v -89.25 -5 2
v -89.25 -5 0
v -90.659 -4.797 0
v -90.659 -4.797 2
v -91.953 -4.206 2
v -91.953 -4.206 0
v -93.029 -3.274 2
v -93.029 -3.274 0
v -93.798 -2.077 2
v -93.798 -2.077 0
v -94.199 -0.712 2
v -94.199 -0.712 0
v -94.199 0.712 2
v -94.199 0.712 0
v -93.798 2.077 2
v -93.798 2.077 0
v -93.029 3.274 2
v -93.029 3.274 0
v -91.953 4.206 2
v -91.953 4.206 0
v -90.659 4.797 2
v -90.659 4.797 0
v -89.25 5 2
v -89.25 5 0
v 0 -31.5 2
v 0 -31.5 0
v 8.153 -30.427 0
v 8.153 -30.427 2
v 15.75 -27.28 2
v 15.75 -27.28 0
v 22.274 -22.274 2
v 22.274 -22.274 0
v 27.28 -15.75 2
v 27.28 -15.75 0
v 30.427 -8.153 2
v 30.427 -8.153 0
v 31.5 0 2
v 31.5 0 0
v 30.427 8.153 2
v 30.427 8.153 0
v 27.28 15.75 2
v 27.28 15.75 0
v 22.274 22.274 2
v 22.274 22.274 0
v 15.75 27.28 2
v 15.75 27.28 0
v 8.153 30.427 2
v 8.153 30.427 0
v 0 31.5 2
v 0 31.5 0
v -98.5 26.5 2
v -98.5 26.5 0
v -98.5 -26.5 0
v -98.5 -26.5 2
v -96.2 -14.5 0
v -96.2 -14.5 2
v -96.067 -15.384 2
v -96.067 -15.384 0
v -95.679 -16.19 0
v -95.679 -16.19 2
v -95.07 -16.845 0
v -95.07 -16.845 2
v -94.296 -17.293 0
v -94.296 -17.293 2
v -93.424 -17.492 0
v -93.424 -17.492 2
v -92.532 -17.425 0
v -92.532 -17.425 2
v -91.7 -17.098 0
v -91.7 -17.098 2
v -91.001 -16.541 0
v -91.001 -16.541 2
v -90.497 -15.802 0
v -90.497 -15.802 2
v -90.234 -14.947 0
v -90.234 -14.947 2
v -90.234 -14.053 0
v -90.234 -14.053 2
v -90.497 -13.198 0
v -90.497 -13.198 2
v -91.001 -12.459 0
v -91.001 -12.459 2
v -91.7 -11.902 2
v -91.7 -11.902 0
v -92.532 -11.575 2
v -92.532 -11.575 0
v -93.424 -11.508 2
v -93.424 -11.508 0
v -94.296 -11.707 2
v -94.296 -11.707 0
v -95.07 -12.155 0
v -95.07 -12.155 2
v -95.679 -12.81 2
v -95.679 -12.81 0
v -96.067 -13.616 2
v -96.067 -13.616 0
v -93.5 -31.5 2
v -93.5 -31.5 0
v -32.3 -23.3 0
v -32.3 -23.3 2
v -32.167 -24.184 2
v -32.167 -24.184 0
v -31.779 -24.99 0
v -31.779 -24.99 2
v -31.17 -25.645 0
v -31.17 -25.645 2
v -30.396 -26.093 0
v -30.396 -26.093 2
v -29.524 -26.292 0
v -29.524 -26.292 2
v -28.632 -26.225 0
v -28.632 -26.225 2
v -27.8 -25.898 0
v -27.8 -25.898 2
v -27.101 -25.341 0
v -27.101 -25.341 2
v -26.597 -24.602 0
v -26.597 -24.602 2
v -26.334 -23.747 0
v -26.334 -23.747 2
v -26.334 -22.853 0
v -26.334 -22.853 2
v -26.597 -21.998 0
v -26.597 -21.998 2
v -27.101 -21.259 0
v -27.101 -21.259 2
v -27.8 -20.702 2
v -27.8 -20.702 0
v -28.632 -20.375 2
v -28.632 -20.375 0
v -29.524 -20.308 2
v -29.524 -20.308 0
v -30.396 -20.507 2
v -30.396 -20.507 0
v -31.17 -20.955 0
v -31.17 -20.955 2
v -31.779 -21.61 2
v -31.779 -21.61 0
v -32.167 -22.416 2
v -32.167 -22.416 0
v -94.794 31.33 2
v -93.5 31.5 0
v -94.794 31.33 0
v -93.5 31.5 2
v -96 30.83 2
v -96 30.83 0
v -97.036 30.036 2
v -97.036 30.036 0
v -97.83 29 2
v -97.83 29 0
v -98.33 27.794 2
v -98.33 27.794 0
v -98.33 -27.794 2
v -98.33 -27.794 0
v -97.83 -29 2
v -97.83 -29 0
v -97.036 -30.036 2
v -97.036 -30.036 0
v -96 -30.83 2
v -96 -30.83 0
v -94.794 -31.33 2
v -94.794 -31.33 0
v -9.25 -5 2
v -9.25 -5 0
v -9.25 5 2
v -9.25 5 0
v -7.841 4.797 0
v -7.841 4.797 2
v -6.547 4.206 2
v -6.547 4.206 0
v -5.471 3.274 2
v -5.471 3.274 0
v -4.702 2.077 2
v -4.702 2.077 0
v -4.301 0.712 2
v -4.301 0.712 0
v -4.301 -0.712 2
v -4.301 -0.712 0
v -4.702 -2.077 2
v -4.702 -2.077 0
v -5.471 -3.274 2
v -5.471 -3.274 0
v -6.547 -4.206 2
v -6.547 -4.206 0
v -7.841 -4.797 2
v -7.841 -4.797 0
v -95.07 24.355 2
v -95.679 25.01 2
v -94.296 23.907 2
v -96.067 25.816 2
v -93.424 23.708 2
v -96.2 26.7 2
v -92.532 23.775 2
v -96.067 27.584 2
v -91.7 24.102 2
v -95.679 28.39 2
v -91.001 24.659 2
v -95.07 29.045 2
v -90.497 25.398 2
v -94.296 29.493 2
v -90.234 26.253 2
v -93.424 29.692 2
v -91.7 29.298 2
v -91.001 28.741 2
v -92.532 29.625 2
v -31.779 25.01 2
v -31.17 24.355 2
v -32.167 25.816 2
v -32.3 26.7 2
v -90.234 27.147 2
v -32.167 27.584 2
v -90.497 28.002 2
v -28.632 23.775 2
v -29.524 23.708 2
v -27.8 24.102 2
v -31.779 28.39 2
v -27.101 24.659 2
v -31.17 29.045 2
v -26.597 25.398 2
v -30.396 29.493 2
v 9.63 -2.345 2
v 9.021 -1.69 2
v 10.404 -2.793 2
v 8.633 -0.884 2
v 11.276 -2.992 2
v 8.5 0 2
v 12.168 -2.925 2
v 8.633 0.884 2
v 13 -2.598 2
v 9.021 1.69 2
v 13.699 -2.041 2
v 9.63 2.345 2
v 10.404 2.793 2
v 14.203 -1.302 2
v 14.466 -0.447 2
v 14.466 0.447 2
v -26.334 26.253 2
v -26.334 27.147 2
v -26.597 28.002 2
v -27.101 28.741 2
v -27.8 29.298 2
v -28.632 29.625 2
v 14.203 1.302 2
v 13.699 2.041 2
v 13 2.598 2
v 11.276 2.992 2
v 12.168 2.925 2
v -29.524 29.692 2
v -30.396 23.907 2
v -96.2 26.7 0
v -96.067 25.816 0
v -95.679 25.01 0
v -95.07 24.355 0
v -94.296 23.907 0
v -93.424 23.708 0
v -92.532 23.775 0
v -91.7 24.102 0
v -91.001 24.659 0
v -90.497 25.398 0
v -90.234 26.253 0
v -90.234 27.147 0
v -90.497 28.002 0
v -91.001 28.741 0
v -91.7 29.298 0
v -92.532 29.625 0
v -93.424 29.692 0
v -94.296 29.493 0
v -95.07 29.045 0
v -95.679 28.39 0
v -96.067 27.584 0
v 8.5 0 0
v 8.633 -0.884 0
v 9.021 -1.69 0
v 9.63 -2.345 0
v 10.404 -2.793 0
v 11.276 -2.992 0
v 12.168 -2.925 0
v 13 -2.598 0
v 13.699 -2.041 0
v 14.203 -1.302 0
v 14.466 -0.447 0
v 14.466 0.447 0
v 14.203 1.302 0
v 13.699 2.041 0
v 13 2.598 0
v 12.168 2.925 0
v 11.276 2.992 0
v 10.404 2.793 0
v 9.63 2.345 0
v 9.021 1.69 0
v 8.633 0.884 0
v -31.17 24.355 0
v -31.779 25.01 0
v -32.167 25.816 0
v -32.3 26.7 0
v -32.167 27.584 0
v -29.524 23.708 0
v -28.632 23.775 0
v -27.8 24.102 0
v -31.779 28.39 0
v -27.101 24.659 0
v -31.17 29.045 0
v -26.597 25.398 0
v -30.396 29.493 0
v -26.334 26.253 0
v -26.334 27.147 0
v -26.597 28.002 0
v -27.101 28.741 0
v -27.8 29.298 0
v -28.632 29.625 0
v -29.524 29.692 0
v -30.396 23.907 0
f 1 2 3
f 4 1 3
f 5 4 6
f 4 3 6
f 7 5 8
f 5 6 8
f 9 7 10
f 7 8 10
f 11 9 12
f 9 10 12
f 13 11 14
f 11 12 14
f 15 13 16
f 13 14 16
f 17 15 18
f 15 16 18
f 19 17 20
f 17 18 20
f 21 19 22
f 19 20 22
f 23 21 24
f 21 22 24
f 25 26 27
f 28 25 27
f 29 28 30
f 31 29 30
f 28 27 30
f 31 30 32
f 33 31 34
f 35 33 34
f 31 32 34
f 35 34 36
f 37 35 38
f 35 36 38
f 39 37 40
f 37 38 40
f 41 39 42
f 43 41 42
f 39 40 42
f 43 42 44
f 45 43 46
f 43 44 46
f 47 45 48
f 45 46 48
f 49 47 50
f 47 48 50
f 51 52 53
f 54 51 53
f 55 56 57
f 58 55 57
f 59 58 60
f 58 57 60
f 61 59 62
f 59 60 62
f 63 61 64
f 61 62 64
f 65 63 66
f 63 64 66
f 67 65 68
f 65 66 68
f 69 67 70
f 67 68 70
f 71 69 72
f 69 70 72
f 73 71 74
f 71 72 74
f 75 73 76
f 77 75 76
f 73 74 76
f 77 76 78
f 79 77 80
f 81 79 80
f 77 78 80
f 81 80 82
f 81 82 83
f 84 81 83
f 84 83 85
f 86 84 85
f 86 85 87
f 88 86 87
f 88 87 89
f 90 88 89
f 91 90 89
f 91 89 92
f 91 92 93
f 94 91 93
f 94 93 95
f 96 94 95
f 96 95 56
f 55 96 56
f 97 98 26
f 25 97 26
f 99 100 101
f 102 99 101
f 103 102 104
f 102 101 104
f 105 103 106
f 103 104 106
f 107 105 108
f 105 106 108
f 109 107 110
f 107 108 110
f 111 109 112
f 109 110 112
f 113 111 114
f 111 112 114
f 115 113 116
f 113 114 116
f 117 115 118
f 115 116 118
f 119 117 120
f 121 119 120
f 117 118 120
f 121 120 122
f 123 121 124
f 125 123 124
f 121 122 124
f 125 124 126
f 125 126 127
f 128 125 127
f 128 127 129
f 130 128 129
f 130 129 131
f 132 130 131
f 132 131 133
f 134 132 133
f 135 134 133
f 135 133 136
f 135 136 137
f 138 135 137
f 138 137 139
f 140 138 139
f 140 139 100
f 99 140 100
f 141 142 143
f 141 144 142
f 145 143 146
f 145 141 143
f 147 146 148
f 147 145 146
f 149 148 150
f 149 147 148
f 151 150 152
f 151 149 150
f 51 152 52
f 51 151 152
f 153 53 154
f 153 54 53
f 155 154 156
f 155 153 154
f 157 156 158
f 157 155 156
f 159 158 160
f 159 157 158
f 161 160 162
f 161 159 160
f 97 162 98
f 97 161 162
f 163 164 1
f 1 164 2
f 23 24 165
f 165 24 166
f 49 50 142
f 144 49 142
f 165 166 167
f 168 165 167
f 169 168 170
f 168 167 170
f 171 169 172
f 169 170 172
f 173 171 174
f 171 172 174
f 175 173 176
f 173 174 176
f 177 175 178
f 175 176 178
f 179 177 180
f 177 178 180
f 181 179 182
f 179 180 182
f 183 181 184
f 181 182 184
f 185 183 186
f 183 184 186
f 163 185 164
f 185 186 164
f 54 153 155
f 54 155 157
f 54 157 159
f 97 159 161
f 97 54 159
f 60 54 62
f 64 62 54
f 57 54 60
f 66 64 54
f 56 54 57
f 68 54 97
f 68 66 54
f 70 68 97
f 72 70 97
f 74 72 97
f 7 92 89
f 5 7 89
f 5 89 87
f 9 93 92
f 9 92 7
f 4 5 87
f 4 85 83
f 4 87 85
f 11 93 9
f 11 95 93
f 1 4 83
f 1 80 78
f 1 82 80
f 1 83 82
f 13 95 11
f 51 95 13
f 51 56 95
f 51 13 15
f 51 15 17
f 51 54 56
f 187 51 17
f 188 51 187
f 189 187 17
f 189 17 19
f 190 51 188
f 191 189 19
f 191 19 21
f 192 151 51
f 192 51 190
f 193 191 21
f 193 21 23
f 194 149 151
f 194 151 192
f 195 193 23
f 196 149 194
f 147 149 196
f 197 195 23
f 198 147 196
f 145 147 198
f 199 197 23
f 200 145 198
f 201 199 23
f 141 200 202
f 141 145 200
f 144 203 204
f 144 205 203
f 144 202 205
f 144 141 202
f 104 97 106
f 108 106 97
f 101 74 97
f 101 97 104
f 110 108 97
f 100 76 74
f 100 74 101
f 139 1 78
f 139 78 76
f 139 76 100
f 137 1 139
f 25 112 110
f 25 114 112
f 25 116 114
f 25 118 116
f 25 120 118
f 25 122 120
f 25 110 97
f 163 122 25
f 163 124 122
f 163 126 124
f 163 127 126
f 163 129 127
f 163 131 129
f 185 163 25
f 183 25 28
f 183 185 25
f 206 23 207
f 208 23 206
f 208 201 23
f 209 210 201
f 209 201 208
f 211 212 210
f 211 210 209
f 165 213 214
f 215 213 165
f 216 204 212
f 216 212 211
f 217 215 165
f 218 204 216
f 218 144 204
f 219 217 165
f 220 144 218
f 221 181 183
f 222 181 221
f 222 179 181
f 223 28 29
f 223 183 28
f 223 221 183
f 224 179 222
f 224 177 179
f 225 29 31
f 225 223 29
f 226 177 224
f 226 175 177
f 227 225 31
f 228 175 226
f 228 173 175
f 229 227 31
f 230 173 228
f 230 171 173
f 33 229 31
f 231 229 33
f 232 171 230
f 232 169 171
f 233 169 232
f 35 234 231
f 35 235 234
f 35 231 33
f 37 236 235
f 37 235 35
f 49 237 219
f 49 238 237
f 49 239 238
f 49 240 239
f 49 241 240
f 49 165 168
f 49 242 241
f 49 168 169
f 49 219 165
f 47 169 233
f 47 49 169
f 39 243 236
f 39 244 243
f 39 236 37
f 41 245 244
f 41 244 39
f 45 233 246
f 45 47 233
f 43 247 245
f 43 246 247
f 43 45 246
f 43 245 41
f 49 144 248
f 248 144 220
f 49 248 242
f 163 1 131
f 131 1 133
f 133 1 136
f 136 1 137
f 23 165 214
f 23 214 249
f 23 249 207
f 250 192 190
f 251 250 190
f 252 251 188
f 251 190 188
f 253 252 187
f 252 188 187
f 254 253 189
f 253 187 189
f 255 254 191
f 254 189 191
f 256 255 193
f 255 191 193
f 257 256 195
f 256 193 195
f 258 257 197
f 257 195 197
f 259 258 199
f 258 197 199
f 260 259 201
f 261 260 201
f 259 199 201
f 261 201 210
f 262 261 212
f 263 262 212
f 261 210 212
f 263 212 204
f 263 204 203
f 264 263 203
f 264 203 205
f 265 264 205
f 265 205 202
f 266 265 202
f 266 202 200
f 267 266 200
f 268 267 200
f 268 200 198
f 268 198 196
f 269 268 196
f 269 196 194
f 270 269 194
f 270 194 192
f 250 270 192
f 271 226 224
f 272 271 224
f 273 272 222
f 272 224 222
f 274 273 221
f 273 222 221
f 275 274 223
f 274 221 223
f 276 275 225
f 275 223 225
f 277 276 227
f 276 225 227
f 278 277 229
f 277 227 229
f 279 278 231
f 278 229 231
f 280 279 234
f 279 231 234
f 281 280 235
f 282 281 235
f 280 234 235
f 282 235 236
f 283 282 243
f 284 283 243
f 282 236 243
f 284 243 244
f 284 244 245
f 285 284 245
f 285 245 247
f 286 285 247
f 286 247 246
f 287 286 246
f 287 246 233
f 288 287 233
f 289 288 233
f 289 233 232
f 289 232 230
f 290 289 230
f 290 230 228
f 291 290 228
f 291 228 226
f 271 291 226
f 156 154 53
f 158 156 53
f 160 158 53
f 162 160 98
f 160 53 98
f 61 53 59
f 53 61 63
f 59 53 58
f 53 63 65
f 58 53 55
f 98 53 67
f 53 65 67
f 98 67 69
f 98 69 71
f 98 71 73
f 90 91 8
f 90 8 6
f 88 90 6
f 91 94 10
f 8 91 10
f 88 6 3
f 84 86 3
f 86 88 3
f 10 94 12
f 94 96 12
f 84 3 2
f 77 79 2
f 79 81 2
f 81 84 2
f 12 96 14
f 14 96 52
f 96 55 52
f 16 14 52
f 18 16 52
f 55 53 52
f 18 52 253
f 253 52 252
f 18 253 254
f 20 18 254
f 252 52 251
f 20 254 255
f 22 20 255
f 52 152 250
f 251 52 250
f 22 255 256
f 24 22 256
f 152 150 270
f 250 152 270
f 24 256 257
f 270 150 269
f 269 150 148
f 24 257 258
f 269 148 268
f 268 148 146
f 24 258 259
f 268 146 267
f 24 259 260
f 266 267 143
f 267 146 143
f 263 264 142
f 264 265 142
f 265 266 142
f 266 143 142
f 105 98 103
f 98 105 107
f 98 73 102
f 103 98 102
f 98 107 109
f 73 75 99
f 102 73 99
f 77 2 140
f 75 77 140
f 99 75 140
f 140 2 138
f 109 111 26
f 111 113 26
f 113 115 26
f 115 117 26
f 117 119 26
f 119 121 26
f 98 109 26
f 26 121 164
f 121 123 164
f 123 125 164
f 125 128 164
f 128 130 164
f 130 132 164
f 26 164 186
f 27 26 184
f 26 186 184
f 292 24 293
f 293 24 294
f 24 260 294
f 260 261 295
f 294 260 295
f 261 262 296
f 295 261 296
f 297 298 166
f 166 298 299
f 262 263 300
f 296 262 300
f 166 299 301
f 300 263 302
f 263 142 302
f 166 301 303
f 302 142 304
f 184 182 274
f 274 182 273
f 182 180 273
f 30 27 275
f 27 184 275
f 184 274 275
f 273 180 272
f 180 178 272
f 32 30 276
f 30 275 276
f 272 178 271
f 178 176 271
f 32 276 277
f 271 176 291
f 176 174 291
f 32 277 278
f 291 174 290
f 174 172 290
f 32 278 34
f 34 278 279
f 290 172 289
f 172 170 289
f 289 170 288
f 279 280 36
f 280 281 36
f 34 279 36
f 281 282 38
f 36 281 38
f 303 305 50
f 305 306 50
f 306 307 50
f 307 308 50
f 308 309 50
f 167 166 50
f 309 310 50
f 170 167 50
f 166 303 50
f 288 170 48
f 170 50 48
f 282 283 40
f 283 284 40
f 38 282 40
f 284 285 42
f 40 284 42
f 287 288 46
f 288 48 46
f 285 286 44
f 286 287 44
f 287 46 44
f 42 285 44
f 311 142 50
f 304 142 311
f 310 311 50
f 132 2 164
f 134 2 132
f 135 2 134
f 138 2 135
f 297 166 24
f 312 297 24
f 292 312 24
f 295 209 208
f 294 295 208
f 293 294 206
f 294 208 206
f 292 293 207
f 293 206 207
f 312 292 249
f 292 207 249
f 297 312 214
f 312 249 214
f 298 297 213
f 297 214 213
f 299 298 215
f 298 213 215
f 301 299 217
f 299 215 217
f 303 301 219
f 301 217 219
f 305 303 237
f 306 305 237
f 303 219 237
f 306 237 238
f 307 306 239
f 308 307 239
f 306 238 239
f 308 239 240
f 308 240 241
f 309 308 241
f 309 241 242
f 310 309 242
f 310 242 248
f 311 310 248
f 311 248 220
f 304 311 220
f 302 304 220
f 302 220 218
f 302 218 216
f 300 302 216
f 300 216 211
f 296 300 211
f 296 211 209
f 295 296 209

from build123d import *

# Parameters (mm, degrees)
F1_DEPTH = 2
F2_D     = 6
F3_R     = 5


with BuildPart() as f1:
    # F0 (on Top) → F1 (new body)
    with BuildSketch(Plane.XY):
        with BuildLine():
            Line((0, 31.5), (-98.5, 31.5))
            Line((-98.5, 31.5), (-98.5, -31.5))
            Line((-98.5, -31.5), (0, -31.5))
            ThreePointArc((0, -31.5), (31.5, 0), (0, 31.5))
        make_face()
        with BuildLine():
            Line((-9.25, -5), (-89.25, -5))
            ThreePointArc((-89.25, -5), (-94.25, 0), (-89.25, 5))
            Line((-89.25, 5), (-9.25, 5))
            ThreePointArc((-9.25, 5), (-4.25, 0), (-9.25, -5))
        make_face(mode=Mode.SUBTRACT)
    extrude(amount=F1_DEPTH)

    # F2 (through all)
    with Locations(Plane(origin=(0, 0, 0), x_dir=(1, 0, 0), z_dir=(0, 0, -1))):
        with Locations((-93.2, -26.7), (-93.2, 14.5), (-29.3, -26.7), (-29.3, 23.3), (11.5, 0)):
            Hole(F2_D / 2)

    # F3
    f3_edges = [f1.edges().sort_by_distance(p)[0] for p in [
        (-98.5, 31.5, 1),
        (-98.5, -31.5, 1),
    ]]
    fillet(f3_edges, radius=F3_R)


solid = f1.part
